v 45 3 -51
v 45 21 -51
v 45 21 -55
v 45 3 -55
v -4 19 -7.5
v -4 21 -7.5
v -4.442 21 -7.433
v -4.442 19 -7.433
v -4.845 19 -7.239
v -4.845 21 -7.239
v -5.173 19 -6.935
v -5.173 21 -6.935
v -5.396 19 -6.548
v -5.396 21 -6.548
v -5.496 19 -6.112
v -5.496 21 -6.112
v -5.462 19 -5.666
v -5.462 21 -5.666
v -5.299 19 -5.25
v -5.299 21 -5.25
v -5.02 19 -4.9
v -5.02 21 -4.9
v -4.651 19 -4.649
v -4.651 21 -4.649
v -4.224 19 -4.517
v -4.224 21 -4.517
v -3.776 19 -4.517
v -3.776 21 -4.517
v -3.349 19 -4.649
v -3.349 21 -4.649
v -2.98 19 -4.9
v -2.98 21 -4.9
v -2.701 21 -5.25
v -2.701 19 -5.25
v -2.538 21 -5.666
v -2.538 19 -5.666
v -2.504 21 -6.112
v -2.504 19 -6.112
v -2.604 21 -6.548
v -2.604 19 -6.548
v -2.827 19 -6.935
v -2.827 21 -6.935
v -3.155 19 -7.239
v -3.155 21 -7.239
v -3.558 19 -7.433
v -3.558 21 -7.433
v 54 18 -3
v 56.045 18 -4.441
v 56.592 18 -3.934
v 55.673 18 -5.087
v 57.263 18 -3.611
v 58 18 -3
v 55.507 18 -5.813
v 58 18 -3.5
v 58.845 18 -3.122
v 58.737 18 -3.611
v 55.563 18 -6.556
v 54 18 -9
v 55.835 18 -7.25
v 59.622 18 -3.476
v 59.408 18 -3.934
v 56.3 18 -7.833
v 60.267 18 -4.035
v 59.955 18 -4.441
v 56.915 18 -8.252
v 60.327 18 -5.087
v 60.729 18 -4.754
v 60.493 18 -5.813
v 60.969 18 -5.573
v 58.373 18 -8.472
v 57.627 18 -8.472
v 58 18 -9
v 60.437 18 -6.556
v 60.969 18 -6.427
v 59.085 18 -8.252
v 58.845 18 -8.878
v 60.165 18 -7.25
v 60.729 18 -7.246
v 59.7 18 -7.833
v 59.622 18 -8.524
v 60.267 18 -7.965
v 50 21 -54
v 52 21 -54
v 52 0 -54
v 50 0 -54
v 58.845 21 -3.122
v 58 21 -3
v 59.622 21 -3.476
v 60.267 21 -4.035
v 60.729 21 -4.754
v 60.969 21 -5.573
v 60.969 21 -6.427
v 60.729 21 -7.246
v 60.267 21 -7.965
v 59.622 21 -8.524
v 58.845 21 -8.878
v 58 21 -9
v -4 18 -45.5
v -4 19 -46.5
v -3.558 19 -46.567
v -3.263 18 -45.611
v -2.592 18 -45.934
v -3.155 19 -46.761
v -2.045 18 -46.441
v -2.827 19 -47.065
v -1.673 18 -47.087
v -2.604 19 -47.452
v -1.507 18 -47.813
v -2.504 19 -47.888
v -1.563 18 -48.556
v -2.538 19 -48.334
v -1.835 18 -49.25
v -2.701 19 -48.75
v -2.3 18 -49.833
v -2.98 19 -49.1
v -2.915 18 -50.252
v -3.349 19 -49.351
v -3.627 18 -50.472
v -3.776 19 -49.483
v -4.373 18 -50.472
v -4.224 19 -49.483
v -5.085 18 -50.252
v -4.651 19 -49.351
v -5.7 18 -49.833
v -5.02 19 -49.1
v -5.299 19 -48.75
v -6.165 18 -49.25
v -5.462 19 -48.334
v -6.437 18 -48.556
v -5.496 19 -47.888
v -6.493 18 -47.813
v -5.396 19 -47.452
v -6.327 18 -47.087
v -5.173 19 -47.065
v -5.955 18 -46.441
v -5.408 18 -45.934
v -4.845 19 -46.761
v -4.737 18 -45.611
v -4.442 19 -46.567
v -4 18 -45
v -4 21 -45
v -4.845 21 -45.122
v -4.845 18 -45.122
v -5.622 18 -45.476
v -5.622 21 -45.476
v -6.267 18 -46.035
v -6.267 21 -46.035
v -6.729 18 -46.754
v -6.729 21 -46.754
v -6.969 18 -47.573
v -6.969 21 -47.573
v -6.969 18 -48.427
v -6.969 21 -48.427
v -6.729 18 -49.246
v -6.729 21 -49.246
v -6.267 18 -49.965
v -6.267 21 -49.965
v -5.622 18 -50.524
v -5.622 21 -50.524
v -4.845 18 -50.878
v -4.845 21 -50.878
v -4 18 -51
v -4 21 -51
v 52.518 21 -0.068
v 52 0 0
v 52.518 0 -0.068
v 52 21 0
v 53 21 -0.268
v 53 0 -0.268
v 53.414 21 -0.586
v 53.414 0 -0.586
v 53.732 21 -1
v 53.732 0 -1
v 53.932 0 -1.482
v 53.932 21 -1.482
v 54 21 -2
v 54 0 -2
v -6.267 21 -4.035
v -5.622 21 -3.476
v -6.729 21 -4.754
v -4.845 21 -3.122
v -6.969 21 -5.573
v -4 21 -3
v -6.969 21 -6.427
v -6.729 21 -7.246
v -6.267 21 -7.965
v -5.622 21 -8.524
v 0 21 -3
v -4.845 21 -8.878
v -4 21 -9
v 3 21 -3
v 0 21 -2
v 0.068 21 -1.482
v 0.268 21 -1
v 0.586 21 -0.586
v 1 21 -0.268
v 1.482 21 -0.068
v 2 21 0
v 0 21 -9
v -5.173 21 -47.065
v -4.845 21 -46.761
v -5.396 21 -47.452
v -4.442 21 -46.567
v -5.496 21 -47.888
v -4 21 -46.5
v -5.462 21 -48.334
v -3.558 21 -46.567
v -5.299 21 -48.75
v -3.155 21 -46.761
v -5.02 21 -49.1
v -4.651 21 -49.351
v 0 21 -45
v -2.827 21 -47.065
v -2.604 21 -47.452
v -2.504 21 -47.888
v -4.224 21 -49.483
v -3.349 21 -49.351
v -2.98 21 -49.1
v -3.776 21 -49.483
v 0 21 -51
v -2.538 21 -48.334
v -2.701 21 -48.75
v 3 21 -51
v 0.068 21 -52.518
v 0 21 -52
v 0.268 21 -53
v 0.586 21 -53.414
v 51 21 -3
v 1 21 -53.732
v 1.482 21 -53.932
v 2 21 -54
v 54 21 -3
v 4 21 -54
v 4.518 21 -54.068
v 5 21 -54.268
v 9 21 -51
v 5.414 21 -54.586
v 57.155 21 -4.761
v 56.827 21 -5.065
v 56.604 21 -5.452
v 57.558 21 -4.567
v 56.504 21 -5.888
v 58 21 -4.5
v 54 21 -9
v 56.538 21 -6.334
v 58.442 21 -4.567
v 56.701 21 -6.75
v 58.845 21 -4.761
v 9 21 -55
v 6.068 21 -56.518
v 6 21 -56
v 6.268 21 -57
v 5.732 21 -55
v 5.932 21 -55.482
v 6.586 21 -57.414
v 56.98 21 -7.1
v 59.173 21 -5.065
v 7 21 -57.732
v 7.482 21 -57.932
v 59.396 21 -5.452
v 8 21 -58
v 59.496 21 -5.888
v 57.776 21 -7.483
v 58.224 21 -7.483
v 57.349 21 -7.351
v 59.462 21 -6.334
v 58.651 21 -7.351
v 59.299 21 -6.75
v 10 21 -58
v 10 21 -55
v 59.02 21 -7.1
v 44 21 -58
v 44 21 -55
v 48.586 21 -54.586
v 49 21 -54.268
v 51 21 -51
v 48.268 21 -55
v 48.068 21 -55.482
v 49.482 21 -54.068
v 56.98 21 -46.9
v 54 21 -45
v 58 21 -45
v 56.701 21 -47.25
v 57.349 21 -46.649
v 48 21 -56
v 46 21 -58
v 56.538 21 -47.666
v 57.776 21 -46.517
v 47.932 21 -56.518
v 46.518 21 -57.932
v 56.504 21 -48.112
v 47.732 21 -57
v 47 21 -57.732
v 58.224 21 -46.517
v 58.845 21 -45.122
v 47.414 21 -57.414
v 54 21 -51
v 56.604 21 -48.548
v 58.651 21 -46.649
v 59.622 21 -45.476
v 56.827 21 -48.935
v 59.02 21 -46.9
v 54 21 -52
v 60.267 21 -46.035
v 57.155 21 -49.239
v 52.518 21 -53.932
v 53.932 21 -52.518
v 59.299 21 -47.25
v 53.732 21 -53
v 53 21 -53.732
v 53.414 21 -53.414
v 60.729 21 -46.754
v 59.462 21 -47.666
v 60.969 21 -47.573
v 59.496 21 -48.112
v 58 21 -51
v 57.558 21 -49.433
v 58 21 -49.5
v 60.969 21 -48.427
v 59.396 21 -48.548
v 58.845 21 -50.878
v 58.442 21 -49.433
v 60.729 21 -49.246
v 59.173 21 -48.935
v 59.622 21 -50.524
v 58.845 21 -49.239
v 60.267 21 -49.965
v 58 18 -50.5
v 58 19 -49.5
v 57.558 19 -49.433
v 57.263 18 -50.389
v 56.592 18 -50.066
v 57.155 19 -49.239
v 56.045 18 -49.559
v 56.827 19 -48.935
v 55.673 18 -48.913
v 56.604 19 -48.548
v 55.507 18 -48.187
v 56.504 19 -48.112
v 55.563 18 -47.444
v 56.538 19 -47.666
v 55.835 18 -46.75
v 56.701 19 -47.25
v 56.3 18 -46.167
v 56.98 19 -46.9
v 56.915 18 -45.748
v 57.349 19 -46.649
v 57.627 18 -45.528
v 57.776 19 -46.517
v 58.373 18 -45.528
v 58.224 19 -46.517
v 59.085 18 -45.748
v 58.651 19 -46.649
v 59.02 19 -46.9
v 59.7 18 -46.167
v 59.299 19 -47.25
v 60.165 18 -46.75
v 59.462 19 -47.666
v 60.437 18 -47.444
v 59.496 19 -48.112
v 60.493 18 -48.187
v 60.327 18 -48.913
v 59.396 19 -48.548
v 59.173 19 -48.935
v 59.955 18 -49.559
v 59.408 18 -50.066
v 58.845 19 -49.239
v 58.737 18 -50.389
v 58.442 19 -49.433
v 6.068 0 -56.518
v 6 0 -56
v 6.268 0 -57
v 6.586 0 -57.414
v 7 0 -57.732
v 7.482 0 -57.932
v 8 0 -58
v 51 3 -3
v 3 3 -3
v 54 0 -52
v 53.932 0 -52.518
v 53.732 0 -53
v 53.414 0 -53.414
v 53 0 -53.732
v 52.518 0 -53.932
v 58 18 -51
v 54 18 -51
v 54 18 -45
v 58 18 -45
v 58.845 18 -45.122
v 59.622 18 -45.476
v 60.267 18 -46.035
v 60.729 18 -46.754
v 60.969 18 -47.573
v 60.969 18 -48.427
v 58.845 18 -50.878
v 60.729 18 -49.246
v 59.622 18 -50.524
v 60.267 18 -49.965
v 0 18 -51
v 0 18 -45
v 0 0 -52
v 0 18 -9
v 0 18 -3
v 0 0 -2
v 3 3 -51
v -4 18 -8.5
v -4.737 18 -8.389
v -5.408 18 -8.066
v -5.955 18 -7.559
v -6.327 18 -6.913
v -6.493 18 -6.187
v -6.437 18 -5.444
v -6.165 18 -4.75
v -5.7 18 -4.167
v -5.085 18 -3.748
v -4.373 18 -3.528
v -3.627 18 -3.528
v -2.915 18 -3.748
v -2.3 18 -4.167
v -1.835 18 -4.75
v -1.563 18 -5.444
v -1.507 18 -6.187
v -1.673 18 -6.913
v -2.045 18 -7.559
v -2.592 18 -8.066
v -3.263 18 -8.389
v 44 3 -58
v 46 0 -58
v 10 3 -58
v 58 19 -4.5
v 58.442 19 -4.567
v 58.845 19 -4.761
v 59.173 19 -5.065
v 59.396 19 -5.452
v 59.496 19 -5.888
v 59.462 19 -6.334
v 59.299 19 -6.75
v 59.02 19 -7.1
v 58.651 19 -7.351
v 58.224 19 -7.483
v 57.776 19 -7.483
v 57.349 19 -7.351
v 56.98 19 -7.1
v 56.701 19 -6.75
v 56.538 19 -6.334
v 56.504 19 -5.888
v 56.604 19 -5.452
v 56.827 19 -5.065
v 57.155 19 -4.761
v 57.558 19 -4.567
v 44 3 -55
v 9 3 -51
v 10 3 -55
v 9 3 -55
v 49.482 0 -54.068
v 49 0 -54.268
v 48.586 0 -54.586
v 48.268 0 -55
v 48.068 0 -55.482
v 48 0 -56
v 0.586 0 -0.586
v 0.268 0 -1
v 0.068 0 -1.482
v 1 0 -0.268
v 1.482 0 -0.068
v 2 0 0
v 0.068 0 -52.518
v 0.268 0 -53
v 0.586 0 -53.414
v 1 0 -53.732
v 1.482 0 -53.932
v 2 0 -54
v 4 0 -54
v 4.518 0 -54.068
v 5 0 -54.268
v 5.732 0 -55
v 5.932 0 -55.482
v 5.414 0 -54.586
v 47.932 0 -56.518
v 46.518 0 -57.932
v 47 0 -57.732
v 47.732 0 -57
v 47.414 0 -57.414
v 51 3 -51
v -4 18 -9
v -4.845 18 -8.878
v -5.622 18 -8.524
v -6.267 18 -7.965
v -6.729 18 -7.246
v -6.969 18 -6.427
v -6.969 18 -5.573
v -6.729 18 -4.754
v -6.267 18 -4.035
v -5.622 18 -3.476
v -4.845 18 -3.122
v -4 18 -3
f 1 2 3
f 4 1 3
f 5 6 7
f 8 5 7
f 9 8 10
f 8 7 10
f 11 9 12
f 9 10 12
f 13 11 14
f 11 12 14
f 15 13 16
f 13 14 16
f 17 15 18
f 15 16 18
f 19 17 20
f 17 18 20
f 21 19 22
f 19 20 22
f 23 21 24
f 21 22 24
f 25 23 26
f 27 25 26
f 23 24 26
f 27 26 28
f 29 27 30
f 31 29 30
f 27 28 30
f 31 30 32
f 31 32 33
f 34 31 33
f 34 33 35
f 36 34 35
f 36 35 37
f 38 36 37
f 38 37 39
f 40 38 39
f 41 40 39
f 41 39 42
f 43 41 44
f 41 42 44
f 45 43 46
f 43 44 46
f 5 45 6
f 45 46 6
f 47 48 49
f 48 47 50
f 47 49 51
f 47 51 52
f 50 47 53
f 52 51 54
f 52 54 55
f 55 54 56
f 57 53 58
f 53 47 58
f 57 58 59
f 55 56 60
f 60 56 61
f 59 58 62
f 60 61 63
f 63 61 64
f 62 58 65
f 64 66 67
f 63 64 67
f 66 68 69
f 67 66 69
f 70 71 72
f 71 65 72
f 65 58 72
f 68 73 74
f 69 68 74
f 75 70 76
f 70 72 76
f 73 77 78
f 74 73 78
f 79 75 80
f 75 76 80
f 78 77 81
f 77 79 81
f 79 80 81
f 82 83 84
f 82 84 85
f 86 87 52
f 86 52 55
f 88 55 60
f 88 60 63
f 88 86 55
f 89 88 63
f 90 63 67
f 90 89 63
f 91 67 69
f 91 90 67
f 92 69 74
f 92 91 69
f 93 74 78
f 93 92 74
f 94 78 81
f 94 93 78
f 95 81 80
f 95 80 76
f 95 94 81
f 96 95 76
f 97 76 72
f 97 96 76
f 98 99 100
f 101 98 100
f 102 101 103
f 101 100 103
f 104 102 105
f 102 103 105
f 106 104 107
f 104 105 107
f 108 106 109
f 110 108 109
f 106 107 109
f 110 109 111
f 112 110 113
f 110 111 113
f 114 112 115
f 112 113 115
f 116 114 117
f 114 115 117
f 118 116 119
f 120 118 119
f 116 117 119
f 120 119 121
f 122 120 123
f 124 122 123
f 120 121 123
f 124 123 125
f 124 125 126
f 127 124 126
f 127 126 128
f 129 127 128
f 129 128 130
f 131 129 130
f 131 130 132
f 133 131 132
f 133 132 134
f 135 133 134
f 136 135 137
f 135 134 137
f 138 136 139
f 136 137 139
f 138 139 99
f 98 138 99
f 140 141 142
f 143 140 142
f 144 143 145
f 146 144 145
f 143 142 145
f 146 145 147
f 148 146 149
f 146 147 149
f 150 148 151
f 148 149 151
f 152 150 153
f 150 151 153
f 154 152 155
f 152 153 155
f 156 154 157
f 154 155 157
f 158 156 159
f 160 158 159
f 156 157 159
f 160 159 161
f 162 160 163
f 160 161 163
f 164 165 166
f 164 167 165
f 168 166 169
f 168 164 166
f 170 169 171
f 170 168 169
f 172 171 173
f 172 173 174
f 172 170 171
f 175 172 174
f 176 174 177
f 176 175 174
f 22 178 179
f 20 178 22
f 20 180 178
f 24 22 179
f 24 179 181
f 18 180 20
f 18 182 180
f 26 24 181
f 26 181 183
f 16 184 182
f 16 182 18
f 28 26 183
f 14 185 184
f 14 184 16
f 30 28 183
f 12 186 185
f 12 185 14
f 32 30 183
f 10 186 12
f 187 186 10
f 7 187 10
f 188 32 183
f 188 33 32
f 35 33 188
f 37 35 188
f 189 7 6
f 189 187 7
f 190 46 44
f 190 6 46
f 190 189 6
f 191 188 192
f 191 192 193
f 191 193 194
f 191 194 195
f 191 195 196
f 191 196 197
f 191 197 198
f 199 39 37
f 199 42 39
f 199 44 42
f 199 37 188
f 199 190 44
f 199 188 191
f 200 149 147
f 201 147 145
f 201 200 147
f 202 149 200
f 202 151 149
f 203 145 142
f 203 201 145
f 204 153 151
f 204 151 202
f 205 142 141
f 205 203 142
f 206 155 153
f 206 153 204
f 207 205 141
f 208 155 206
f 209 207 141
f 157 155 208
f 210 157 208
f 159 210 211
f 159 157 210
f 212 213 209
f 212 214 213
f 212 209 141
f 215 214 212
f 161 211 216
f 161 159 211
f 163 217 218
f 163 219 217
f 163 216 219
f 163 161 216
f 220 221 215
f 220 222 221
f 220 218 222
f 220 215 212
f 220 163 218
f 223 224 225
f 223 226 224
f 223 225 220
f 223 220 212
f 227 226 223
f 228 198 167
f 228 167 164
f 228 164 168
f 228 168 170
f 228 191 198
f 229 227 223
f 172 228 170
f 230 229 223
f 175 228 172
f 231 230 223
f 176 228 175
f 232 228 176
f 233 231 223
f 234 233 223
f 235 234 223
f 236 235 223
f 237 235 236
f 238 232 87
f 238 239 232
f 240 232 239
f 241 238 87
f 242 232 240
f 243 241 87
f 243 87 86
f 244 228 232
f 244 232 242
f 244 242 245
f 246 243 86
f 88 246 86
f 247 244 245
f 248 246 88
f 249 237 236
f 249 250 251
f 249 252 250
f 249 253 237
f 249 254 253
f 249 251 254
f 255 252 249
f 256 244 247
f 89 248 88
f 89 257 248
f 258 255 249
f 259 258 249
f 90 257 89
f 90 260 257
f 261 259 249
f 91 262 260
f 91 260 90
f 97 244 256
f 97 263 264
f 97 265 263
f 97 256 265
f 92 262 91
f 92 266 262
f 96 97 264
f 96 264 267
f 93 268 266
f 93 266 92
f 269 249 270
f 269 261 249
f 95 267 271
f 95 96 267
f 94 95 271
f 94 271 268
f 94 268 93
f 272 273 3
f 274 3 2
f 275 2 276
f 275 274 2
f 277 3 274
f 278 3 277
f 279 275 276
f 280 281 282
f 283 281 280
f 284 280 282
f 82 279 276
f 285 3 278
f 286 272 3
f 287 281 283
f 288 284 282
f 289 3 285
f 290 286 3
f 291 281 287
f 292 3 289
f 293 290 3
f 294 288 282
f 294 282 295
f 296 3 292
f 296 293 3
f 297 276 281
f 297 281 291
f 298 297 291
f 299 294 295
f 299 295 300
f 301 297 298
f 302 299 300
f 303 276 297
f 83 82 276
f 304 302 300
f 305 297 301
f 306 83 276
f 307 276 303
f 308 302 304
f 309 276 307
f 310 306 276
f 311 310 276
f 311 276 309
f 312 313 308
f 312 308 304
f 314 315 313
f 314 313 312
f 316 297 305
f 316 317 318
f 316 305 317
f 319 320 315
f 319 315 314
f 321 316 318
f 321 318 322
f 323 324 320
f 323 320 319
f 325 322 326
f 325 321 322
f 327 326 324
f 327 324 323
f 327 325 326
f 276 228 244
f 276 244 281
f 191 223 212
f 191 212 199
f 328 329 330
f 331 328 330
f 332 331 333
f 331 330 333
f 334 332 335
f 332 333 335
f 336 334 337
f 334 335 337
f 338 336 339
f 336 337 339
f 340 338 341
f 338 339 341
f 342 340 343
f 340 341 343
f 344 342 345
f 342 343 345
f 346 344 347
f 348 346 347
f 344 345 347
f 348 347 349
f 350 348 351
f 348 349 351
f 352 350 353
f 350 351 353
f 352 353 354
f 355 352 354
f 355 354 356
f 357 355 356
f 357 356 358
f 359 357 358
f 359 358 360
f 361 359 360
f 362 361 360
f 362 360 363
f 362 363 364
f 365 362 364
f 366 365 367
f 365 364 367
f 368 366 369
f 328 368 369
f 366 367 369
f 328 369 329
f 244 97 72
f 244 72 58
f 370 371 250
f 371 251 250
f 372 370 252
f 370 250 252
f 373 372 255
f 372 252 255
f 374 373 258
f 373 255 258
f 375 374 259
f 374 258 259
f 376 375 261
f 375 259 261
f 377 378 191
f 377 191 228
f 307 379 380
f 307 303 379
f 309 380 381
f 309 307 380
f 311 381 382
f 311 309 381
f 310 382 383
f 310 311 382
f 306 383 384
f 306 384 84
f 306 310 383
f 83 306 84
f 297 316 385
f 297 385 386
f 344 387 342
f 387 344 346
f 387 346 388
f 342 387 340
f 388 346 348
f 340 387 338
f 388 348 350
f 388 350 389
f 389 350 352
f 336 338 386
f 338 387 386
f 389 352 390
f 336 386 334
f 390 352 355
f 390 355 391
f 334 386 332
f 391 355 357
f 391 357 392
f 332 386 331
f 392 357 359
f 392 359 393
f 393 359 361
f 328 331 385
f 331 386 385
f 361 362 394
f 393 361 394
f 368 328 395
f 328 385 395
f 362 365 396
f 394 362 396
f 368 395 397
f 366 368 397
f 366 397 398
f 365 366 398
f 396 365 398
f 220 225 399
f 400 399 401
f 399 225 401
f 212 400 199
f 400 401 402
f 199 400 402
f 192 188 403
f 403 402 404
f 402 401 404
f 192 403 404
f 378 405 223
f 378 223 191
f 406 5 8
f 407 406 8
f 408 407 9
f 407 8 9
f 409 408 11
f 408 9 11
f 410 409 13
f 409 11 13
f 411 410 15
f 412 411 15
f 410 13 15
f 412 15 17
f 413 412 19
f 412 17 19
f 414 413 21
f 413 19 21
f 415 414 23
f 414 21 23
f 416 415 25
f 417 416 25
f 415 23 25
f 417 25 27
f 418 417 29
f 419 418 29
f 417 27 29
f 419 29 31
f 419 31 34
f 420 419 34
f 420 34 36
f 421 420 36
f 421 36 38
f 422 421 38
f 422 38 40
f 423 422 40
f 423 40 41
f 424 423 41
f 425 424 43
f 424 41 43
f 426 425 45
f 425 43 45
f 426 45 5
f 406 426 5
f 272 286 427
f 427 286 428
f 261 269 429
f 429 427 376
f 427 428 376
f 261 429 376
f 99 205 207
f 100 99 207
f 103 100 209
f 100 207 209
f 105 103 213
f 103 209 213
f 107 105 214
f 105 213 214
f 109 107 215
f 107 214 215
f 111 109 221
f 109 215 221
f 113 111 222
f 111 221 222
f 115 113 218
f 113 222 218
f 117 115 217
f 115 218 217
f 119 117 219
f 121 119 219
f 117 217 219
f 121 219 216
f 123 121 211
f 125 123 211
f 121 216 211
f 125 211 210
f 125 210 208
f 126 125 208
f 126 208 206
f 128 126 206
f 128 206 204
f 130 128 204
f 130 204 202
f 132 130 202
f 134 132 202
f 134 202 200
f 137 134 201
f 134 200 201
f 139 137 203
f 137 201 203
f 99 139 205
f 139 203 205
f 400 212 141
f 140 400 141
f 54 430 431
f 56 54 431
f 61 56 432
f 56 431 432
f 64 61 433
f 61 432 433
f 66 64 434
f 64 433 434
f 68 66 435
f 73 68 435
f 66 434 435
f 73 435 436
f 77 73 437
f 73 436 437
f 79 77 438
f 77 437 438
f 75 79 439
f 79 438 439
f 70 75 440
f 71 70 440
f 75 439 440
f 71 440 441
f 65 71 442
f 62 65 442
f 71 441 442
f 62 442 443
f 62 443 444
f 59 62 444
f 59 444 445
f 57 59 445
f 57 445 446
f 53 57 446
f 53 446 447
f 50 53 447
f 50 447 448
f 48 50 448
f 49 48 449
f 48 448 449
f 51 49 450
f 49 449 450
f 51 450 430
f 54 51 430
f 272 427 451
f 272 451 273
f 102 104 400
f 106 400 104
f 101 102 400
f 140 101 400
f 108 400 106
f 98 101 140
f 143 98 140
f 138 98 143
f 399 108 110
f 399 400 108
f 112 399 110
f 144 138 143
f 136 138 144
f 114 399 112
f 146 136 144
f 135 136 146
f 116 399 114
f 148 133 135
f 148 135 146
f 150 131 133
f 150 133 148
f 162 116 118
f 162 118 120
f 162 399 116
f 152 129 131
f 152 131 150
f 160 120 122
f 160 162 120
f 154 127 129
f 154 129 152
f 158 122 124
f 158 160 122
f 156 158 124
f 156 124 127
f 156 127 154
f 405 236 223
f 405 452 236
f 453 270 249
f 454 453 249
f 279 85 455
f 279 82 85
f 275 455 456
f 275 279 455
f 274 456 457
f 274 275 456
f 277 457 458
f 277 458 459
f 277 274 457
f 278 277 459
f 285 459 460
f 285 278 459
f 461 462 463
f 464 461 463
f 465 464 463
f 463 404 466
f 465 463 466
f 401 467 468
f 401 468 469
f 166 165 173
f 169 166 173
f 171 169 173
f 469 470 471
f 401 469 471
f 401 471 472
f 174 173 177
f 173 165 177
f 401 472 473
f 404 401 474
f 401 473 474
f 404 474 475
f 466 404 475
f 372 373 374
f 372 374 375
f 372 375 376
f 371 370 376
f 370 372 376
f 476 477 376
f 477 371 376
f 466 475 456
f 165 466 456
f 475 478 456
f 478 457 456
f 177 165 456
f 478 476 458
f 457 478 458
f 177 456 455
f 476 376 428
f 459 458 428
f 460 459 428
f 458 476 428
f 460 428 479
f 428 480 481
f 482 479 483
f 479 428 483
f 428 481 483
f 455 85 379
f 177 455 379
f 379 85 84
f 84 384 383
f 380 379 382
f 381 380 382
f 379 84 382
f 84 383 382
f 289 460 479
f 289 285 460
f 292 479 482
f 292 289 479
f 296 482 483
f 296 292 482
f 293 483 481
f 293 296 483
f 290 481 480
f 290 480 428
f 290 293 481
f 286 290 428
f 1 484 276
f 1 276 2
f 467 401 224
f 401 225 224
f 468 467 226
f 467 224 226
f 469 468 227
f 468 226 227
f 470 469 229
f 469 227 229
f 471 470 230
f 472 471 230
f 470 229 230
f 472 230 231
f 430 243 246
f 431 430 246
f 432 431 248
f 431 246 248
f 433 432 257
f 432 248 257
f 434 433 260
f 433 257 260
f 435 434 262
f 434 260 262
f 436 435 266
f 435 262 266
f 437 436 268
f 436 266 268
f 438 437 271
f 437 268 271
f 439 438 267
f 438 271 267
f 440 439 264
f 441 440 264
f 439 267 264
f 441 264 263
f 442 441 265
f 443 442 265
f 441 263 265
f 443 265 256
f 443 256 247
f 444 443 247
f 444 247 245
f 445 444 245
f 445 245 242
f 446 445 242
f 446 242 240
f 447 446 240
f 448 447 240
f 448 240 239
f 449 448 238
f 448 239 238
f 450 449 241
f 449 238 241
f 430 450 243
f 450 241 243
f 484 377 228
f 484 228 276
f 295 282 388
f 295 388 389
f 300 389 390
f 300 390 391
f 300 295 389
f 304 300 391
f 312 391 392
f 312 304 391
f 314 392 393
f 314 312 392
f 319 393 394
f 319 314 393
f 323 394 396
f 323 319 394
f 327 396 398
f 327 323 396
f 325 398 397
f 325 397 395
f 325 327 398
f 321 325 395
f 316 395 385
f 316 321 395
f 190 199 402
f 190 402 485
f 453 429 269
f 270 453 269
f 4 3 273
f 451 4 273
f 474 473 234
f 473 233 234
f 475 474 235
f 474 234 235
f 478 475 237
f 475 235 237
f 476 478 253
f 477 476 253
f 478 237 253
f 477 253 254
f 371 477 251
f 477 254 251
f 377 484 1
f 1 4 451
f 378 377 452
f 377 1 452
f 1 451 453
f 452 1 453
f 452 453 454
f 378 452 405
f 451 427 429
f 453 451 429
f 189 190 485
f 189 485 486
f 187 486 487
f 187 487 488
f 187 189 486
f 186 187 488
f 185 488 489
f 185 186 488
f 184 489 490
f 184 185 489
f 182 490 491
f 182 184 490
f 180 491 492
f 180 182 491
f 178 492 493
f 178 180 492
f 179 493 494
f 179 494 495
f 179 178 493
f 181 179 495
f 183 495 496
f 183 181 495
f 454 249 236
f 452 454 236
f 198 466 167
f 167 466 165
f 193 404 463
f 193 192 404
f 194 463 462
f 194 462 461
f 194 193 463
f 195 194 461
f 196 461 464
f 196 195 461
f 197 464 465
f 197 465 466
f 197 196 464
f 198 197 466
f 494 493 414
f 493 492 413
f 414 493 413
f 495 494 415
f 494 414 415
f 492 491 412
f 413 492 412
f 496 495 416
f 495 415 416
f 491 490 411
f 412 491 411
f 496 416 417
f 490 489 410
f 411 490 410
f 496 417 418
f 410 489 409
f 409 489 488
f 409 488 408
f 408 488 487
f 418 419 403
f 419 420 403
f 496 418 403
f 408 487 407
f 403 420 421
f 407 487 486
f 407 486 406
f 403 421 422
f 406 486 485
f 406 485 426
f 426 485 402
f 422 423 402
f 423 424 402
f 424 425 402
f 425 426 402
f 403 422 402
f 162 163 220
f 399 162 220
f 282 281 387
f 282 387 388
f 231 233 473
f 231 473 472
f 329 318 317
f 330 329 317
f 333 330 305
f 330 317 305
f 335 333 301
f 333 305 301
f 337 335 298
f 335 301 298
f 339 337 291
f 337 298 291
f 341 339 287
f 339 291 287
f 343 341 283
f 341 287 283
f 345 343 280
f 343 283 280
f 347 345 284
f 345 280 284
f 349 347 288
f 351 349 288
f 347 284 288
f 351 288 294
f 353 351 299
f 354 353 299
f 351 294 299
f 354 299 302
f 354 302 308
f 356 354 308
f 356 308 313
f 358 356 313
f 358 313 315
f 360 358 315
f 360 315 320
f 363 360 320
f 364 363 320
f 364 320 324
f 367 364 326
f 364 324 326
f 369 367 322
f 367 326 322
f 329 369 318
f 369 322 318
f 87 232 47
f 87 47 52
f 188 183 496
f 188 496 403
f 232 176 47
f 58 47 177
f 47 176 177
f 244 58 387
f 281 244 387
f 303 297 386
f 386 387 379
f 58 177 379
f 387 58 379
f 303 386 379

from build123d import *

# Parameters (mm, degrees)
BOSS_EXTRUDE1_DEPTH = 21
SHELL2_T            = -3
SKETCH2_W           = 34
SKETCH2_H           = 18
CUT_EXTRUDE1_DEPTH  = 3
FILLET2_R           = 2
SKETCH4_R           = 1.5
BOSS_EXTRUDE2_DEPTH = 3
CHAMFER1_SIZE       = 1


with BuildPart() as part:
    # Sketch1 → Boss-Extrude1 (new body)
    with BuildSketch(Plane(origin=(0, 0, 0), x_dir=(1, 0, 0), z_dir=(0, 1, 0))):
        Polygon((0, 54), (0, 0), (54, 0), (54, 54), (48, 54), (48, 58), (6, 58), (6, 54), align=None)
    extrude(amount=BOSS_EXTRUDE1_DEPTH)

    # Shell2
    shell2_openings = [part.faces().sort_by_distance(p)[0] for p in [
        (27, 21, -28.579766537),
    ]]
    offset(amount=SHELL2_T, openings=shell2_openings, kind=Kind.INTERSECTION)

    # Sketch2 → Cut-Extrude1 (cut)
    with BuildSketch(Plane(origin=(0, 0, -58), x_dir=(-1, 0, 0), z_dir=(0, 0, -1))):
        with Locations((-27, 12)):
            Rectangle(SKETCH2_W, SKETCH2_H)
    extrude(amount=-CUT_EXTRUDE1_DEPTH, mode=Mode.SUBTRACT)

    # Fillet2
    fillet2_edges = [part.edges().sort_by_distance(p)[0] for p in [
        (6, 10.5, -58),
        (6, 10.5, -54),
        (0, 10.5, -54),
        (0, 10.5, 0),
        (54, 10.5, 0),
        (48, 10.5, -54),
        (48, 10.5, -58),
        (54, 10.5, -54),
    ]]
    fillet(fillet2_edges, radius=FILLET2_R - 0.0001)  # a hair under: the kernel refuses the full size

    # Sketch4 → Boss-Extrude2 (add)
    # profile 1 of 4: a face of its own
    with BuildSketch(Plane(origin=(0, 21, 0), x_dir=(1, 0, 0), z_dir=(0, 1, 0))):
        with BuildLine():
            Line((0, 51), (0, 45))
            Line((0, 45), (-4, 45))
            ThreePointArc((-4, 45), (-7, 48), (-4, 51))
            Line((-4, 51), (0, 51))
        make_face()
        with Locations(Location((-4, 48, 0), (0, 0, 270))):
            Circle(SKETCH4_R, mode=Mode.SUBTRACT)
    # profile 2 of 4: a face of its own
    with BuildSketch(Plane(origin=(0, 21, 0), x_dir=(1, 0, 0), z_dir=(0, 1, 0))):
        with BuildLine():
            Line((-4, 3), (0, 3))
            Line((0, 3), (0, 9))
            Line((0, 9), (-4, 9))
            ThreePointArc((-4, 9), (-7, 6), (-4, 3))
        make_face()
        with Locations(Location((-4, 6, 0), (0, 0, 90))):
            Circle(SKETCH4_R, mode=Mode.SUBTRACT)
    # profile 3 of 4: a face of its own
    with BuildSketch(Plane(origin=(0, 21, 0), x_dir=(1, 0, 0), z_dir=(0, 1, 0))):
        with BuildLine():
            Line((58, 9), (54, 9))
            Line((54, 9), (54, 3))
            Line((54, 3), (58, 3))
            ThreePointArc((58, 3), (61, 6), (58, 9))
        make_face()
        with Locations(Location((58, 6, 0), (0, 0, 270))):
            Circle(SKETCH4_R, mode=Mode.SUBTRACT)
    # profile 4 of 4: a face of its own
    with BuildSketch(Plane(origin=(0, 21, 0), x_dir=(1, 0, 0), z_dir=(0, 1, 0))):
        with BuildLine():
            Line((58, 51), (54, 51))
            Line((54, 51), (54, 45))
            Line((54, 45), (58, 45))
            ThreePointArc((58, 45), (61, 48), (58, 51))
        make_face()
        with Locations(Location((58, 48, 0), (0, 0, 90))):
            Circle(SKETCH4_R, mode=Mode.SUBTRACT)
    extrude(amount=-BOSS_EXTRUDE2_DEPTH)

    # Chamfer1
    chamfer1_edges = [part.edges().sort_by_distance(p)[0] for p in [
        (-4, 18, -49.5),
        (-4, 18, -4.5),
        (58, 18, -7.5),
        (58, 18, -46.5),
    ]]
    chamfer(chamfer1_edges, length=CHAMFER1_SIZE)


solid = part.part
